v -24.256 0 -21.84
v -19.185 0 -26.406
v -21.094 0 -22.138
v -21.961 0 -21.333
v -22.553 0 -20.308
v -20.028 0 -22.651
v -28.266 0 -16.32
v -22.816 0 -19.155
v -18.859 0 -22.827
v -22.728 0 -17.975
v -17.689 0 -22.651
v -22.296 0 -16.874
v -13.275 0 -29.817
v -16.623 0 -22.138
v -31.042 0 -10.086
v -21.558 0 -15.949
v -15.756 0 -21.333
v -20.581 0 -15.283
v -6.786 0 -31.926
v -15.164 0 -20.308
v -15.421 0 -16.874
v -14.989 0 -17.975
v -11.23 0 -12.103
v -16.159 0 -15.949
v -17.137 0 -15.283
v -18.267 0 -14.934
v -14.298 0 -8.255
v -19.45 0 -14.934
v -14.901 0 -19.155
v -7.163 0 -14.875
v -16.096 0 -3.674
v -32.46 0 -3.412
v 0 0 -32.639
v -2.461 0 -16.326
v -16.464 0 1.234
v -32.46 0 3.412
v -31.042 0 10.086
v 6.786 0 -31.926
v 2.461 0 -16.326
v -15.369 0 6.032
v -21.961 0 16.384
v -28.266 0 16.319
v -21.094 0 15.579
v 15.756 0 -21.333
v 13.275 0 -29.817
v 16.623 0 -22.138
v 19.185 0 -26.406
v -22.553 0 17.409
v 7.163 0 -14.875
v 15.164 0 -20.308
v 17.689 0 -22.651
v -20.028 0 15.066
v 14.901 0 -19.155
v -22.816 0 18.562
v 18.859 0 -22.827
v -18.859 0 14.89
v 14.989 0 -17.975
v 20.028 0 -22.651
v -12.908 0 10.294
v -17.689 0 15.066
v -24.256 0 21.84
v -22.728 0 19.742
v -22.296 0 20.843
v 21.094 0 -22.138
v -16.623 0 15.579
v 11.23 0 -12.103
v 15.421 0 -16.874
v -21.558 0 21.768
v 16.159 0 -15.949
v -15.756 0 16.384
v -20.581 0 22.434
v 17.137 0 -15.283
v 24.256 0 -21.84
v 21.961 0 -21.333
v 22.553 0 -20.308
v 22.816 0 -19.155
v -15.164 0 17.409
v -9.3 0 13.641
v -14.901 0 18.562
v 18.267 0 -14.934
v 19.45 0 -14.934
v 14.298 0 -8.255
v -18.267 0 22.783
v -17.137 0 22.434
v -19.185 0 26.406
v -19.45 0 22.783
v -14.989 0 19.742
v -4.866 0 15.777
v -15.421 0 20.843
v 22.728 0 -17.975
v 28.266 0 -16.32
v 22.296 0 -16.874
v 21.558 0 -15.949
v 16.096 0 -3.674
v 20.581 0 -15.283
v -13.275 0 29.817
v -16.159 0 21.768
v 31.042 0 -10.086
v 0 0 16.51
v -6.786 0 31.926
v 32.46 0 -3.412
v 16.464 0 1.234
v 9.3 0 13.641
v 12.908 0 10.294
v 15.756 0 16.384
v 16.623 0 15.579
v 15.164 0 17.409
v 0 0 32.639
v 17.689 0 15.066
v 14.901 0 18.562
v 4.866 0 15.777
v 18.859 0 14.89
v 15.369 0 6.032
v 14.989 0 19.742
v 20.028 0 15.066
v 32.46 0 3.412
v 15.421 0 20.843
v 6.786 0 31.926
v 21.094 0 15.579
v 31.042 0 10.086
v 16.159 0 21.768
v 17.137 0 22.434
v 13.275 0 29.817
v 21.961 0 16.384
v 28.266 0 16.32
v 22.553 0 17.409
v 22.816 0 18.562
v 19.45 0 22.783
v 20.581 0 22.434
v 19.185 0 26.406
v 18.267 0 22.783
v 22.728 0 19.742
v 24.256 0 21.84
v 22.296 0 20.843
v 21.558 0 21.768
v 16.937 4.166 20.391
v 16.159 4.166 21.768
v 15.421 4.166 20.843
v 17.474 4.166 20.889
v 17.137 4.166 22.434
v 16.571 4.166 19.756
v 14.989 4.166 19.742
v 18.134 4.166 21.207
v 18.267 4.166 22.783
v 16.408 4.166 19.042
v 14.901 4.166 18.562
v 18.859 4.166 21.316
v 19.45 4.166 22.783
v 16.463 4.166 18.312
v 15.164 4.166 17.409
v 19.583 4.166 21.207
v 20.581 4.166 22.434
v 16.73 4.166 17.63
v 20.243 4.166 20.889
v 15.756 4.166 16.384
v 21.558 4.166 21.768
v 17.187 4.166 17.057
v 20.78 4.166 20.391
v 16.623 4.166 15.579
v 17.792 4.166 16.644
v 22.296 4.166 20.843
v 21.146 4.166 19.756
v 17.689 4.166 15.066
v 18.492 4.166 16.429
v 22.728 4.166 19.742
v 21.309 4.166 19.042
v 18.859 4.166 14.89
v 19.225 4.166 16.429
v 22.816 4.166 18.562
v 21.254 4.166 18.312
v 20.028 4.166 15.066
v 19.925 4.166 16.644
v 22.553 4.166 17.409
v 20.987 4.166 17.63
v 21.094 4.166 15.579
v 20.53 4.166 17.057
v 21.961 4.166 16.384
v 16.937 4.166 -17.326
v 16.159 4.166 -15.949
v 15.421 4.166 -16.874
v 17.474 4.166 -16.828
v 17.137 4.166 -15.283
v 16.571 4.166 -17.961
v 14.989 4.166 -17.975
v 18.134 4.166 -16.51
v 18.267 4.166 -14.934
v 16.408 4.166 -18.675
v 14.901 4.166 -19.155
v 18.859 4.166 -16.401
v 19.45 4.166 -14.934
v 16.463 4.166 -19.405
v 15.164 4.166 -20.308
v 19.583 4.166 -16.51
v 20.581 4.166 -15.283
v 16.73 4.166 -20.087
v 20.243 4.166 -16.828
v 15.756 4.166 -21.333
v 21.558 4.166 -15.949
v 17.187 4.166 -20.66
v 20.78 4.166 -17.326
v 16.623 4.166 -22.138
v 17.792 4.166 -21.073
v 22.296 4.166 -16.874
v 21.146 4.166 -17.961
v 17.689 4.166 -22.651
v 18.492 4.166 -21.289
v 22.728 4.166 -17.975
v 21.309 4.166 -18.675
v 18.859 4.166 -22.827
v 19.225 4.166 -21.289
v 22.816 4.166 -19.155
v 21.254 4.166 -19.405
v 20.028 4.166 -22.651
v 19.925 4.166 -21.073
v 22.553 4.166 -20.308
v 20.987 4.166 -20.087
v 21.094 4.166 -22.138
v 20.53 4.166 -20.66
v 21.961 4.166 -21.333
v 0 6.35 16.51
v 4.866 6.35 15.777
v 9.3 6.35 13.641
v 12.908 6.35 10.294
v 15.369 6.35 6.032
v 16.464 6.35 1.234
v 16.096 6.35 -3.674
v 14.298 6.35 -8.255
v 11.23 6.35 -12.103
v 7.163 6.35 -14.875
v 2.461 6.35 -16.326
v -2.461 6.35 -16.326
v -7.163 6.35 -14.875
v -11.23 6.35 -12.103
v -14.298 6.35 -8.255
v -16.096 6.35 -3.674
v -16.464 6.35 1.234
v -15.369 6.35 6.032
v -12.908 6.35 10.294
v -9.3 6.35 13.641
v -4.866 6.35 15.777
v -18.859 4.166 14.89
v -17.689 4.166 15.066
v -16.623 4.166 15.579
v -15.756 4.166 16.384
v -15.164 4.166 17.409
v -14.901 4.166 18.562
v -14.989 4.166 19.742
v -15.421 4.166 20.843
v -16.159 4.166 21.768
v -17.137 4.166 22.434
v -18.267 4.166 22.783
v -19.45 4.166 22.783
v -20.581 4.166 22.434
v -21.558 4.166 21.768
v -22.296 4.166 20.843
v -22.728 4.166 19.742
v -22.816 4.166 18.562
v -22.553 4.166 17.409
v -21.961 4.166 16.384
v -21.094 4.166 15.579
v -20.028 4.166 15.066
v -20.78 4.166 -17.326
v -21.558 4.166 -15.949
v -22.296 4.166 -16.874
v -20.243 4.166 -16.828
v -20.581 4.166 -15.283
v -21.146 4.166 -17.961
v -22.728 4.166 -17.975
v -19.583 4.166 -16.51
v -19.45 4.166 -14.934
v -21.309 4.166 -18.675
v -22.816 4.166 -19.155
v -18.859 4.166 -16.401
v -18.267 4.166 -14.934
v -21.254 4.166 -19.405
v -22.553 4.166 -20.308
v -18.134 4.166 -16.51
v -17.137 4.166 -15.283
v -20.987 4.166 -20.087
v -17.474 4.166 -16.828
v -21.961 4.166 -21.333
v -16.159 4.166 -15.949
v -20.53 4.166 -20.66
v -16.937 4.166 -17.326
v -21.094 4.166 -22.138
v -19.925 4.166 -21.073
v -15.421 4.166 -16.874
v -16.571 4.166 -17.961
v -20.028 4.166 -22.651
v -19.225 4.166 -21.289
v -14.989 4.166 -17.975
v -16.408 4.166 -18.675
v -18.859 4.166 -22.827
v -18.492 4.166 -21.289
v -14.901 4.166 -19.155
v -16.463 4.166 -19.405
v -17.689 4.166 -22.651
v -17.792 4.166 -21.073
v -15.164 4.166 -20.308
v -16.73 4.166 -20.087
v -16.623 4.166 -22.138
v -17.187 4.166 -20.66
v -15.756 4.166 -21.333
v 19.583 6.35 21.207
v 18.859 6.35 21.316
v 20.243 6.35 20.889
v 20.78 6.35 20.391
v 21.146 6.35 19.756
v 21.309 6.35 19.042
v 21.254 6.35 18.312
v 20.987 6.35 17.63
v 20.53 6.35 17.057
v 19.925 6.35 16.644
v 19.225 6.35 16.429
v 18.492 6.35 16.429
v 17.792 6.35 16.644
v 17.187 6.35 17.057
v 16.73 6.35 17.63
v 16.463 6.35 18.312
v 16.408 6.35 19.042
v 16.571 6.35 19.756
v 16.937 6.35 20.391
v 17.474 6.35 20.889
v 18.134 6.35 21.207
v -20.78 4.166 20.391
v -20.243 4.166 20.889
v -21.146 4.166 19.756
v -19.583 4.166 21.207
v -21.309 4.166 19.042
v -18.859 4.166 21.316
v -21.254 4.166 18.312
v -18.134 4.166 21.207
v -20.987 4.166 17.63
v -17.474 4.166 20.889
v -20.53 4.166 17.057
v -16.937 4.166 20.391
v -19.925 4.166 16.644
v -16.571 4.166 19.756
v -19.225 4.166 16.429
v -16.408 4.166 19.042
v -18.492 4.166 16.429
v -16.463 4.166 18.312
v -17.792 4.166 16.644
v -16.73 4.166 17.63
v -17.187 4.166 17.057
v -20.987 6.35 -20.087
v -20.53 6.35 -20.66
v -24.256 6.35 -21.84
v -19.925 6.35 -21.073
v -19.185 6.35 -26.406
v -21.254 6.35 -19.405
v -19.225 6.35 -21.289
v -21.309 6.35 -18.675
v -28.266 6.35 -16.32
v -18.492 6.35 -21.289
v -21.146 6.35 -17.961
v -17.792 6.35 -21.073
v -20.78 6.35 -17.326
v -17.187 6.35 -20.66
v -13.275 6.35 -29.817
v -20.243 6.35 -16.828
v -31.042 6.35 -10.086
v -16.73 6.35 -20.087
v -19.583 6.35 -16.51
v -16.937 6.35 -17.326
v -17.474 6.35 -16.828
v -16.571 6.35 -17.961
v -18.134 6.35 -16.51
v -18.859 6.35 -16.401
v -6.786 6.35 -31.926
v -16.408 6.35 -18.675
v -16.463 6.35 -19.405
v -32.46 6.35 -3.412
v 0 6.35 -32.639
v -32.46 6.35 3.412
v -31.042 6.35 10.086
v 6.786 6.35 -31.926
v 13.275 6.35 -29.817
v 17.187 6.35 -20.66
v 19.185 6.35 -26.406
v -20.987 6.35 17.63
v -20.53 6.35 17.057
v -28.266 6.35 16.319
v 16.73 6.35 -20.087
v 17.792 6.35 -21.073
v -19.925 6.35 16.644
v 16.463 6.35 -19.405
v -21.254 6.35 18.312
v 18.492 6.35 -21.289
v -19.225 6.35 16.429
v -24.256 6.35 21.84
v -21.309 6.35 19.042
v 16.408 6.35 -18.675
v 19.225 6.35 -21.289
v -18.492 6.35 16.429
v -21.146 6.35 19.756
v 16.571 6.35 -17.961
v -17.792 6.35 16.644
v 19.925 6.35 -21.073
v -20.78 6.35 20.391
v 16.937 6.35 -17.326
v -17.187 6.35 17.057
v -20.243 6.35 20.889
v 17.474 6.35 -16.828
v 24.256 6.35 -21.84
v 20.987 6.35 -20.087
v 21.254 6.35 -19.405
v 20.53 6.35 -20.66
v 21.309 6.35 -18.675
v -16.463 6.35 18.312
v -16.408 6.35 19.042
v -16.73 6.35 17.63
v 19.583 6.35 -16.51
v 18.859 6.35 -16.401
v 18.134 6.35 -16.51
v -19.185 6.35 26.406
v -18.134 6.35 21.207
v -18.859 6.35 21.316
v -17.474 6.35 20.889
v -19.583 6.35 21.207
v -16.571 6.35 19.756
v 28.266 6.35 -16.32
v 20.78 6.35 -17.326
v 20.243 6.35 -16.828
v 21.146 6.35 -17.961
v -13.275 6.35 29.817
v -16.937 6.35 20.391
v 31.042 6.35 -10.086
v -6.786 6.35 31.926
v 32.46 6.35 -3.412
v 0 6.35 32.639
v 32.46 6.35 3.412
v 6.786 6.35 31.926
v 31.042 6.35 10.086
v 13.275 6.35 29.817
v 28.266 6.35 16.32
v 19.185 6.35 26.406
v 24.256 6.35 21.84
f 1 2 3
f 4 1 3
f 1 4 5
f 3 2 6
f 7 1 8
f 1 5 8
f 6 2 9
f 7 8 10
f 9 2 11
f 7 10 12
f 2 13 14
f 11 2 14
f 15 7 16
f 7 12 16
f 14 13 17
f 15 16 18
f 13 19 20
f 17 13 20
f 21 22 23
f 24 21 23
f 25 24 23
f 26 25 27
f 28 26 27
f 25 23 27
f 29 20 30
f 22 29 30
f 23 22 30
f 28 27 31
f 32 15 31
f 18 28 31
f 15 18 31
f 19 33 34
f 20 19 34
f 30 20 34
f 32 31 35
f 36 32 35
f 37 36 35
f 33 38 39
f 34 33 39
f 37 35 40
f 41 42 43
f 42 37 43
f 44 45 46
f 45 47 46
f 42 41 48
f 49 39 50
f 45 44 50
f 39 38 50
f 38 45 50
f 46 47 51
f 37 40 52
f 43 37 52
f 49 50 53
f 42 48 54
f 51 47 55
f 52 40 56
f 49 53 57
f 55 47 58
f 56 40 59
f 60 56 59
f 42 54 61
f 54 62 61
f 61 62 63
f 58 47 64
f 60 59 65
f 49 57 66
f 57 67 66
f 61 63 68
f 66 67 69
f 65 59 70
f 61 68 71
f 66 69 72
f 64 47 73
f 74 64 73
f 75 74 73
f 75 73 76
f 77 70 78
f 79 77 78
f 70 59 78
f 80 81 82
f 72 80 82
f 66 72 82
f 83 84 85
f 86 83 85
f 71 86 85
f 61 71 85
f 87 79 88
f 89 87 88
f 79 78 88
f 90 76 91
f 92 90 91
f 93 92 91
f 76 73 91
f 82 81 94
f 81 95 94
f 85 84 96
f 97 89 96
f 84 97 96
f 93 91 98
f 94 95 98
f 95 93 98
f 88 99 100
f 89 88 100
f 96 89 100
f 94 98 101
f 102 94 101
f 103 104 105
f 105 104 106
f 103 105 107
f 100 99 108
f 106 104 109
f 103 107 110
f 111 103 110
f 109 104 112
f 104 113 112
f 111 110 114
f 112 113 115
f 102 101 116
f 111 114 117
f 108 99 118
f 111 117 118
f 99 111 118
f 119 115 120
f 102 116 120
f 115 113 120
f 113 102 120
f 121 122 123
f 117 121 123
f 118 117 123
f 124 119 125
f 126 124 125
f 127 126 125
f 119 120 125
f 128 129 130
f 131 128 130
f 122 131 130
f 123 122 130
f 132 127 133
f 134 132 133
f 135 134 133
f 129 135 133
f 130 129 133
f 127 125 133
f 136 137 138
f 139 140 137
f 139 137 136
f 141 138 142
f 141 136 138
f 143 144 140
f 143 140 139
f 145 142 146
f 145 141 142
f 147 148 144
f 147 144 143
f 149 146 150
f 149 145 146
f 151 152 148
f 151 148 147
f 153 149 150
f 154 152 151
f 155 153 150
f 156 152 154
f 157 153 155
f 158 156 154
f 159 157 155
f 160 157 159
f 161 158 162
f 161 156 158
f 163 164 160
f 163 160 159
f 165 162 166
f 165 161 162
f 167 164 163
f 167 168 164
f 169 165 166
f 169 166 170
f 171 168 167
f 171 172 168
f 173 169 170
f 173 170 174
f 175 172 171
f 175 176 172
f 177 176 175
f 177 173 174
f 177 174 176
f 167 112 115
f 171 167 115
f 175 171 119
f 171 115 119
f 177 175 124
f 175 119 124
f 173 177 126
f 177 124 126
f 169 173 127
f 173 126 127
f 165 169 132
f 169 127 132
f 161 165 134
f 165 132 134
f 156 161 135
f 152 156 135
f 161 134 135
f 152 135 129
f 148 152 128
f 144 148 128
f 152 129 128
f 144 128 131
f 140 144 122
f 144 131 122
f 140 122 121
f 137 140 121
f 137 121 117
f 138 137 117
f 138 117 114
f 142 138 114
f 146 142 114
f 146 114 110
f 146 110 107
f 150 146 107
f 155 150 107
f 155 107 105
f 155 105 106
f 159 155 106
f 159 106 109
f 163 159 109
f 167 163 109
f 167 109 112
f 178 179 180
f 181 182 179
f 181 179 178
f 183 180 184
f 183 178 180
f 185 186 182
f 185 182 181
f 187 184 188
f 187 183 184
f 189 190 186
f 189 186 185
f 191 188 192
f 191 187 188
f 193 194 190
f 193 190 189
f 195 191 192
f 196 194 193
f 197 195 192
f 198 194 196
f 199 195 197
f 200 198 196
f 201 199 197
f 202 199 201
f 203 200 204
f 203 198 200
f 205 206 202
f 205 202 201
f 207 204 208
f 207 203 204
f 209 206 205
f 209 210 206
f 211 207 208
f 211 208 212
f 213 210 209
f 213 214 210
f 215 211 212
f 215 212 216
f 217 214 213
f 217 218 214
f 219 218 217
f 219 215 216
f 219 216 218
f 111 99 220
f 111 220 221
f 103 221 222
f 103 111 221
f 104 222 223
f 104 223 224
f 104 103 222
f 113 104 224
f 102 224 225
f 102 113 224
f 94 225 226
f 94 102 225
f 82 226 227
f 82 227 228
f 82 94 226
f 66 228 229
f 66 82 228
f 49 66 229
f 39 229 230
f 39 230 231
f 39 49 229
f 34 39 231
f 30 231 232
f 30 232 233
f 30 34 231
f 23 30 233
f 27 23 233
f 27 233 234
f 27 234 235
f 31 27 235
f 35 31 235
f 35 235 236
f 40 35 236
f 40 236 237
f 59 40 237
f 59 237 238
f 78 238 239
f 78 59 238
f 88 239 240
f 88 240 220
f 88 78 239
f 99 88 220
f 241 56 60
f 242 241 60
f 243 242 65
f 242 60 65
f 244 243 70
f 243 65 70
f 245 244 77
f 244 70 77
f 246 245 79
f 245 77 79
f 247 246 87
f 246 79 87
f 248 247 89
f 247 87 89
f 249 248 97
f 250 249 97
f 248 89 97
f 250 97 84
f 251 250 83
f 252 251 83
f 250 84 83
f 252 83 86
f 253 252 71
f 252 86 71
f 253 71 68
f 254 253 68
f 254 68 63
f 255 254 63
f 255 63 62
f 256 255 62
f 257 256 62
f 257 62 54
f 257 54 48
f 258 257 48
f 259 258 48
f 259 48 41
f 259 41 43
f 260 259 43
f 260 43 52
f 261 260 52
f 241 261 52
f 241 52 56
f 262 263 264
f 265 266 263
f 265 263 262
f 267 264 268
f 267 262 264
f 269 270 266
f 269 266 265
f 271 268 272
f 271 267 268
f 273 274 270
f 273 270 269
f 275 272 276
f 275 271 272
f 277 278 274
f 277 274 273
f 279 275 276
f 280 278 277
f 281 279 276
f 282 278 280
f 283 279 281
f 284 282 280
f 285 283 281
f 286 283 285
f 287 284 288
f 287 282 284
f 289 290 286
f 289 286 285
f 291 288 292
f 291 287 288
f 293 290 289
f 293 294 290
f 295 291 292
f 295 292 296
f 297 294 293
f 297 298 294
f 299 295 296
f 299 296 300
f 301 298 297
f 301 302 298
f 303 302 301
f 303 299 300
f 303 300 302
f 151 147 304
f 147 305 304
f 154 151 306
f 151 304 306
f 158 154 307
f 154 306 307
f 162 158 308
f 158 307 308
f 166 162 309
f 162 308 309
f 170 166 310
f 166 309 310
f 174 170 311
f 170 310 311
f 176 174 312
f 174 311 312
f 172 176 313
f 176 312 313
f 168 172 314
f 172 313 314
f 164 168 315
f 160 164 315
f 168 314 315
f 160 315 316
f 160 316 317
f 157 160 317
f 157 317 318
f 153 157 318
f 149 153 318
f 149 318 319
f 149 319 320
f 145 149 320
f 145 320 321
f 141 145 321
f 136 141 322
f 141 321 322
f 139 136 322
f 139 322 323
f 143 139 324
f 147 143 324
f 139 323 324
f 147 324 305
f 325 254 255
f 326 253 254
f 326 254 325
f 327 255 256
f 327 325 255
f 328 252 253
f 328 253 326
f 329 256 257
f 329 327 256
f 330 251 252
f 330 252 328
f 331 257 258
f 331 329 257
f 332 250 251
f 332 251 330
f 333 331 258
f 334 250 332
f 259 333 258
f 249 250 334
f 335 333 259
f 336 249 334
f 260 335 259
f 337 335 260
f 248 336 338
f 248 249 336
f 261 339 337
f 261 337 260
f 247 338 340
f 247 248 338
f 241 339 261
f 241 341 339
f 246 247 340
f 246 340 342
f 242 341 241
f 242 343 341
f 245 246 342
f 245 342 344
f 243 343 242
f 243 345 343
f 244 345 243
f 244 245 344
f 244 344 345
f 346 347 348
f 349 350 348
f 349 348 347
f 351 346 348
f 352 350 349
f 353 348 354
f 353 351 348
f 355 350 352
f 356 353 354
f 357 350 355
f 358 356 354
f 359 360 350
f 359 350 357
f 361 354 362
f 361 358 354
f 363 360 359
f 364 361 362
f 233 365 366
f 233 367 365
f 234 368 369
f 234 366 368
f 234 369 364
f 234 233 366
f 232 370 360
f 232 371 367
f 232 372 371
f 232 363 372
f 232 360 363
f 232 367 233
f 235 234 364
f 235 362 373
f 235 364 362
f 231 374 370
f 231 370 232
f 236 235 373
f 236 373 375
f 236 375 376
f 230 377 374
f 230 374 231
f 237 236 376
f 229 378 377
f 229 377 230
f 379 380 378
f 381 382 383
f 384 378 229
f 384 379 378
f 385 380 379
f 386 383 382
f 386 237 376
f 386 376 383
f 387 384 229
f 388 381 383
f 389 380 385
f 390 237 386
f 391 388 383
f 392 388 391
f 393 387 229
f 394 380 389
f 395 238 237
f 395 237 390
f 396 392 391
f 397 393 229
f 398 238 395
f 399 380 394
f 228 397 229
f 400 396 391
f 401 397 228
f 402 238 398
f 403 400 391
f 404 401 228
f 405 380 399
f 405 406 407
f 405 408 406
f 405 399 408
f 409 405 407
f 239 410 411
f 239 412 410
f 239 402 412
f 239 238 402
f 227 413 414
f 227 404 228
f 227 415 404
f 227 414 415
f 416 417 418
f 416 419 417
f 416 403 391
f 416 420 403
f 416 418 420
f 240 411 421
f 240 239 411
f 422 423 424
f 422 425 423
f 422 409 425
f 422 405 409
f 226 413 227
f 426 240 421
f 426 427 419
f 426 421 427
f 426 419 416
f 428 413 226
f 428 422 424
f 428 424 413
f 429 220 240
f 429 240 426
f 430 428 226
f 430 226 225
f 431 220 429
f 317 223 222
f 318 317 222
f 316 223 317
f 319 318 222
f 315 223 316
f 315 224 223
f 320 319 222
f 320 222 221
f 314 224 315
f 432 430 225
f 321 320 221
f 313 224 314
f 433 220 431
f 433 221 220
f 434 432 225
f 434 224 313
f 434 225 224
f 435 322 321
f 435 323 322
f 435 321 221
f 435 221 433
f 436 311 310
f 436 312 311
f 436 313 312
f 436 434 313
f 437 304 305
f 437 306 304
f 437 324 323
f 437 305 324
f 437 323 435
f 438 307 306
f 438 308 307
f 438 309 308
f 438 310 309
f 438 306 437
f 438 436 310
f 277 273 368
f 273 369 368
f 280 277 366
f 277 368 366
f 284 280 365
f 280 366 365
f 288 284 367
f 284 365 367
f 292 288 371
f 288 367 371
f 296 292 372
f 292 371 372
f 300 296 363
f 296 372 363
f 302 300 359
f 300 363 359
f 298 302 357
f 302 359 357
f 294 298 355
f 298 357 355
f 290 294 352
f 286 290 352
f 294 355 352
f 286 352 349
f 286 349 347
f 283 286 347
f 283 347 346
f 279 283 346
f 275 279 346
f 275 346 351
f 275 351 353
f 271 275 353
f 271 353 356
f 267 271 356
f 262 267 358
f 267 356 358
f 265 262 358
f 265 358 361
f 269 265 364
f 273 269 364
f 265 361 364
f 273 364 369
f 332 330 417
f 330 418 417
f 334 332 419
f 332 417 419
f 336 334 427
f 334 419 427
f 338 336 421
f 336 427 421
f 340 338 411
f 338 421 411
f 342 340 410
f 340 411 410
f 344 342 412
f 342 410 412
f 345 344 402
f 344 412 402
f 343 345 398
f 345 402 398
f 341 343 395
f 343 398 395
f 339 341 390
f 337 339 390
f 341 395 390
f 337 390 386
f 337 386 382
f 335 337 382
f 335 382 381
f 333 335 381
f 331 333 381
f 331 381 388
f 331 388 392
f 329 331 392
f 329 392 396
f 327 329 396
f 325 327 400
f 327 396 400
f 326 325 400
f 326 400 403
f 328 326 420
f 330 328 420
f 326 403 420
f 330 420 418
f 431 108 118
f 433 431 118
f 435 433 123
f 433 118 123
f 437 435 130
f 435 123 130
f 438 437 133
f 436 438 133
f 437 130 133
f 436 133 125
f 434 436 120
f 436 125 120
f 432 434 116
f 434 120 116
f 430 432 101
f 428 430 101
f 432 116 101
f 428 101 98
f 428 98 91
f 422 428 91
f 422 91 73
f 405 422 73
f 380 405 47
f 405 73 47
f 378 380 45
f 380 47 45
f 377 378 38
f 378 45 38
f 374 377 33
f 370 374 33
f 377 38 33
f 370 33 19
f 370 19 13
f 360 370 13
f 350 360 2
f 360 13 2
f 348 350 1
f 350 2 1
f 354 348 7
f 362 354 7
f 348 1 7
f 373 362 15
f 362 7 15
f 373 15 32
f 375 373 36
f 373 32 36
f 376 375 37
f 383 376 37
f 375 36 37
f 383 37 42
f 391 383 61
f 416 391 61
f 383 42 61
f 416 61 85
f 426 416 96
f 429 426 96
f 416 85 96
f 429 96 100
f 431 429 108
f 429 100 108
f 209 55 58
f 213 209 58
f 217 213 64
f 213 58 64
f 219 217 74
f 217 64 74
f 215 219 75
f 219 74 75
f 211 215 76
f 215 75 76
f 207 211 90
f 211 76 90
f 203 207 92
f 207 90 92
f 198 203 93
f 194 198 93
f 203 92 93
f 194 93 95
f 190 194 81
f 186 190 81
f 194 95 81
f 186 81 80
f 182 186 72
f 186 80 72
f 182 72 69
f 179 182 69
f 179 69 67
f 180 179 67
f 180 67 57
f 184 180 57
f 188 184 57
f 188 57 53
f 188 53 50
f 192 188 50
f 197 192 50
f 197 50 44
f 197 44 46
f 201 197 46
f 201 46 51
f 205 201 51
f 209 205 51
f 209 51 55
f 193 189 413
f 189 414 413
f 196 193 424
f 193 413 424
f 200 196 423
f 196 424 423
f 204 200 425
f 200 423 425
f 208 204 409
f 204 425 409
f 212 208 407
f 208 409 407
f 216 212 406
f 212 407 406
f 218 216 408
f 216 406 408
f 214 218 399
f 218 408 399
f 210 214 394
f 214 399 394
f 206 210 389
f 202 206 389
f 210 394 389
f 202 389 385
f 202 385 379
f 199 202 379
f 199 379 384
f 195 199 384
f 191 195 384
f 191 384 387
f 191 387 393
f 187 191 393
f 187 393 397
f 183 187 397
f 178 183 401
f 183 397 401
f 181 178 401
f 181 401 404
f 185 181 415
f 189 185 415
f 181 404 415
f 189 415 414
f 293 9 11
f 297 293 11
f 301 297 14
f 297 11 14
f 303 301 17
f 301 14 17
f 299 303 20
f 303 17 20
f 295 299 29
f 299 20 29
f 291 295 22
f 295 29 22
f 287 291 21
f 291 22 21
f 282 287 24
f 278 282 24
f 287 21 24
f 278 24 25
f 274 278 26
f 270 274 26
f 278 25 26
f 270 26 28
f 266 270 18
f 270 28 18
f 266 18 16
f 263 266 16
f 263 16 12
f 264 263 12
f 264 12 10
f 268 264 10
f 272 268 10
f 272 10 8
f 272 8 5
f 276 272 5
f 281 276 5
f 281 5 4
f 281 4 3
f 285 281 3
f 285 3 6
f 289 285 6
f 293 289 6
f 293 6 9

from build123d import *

# Parameters (mm, degrees)
SKETCH1_R                                      = 32.639
SKETCH1_R_2                                    = 16.51
EXTRUDE1_DEPTH                                 = 6.35
CBORE_FOR_8_SOCKET_HEAD_CAP_SCREW1_D           = 4.9149
CBORE_FOR_8_SOCKET_HEAD_CAP_SCREW1_CBORE_D     = 7.9375
CBORE_FOR_8_SOCKET_HEAD_CAP_SCREW1_CBORE_DEPTH = 4.1656


with BuildPart() as part:
    # Sketch1 → Extrude1 (new body)
    with BuildSketch(Plane(origin=(0, 0, 0), x_dir=(1, 0, 0), z_dir=(0, 1, 0))):
        with Locations(Location((0, 0, 0), (0, 0, 270))):  # turned: the seam where the file's is
            Circle(SKETCH1_R)
        with Locations(Location((0, 0, 0), (0, 0, 270))):  # turned: the seam where the file's is
            Circle(SKETCH1_R_2, mode=Mode.SUBTRACT)
    extrude(amount=EXTRUDE1_DEPTH)

    # CBORE for #8 Socket Head Cap Screw1 (through all)
    with Locations(Plane(origin=(-18.858537854, 0, 18.858537854), x_dir=(0, 0, -1), z_dir=(0, -1, 0))):
        with Locations((0, 0), (0, 37.717075708), (37.717075708, 37.717075708), (37.717075708, 0)):
            CounterBoreHole(CBORE_FOR_8_SOCKET_HEAD_CAP_SCREW1_D / 2, CBORE_FOR_8_SOCKET_HEAD_CAP_SCREW1_CBORE_D / 2, CBORE_FOR_8_SOCKET_HEAD_CAP_SCREW1_CBORE_DEPTH)


solid = part.part
